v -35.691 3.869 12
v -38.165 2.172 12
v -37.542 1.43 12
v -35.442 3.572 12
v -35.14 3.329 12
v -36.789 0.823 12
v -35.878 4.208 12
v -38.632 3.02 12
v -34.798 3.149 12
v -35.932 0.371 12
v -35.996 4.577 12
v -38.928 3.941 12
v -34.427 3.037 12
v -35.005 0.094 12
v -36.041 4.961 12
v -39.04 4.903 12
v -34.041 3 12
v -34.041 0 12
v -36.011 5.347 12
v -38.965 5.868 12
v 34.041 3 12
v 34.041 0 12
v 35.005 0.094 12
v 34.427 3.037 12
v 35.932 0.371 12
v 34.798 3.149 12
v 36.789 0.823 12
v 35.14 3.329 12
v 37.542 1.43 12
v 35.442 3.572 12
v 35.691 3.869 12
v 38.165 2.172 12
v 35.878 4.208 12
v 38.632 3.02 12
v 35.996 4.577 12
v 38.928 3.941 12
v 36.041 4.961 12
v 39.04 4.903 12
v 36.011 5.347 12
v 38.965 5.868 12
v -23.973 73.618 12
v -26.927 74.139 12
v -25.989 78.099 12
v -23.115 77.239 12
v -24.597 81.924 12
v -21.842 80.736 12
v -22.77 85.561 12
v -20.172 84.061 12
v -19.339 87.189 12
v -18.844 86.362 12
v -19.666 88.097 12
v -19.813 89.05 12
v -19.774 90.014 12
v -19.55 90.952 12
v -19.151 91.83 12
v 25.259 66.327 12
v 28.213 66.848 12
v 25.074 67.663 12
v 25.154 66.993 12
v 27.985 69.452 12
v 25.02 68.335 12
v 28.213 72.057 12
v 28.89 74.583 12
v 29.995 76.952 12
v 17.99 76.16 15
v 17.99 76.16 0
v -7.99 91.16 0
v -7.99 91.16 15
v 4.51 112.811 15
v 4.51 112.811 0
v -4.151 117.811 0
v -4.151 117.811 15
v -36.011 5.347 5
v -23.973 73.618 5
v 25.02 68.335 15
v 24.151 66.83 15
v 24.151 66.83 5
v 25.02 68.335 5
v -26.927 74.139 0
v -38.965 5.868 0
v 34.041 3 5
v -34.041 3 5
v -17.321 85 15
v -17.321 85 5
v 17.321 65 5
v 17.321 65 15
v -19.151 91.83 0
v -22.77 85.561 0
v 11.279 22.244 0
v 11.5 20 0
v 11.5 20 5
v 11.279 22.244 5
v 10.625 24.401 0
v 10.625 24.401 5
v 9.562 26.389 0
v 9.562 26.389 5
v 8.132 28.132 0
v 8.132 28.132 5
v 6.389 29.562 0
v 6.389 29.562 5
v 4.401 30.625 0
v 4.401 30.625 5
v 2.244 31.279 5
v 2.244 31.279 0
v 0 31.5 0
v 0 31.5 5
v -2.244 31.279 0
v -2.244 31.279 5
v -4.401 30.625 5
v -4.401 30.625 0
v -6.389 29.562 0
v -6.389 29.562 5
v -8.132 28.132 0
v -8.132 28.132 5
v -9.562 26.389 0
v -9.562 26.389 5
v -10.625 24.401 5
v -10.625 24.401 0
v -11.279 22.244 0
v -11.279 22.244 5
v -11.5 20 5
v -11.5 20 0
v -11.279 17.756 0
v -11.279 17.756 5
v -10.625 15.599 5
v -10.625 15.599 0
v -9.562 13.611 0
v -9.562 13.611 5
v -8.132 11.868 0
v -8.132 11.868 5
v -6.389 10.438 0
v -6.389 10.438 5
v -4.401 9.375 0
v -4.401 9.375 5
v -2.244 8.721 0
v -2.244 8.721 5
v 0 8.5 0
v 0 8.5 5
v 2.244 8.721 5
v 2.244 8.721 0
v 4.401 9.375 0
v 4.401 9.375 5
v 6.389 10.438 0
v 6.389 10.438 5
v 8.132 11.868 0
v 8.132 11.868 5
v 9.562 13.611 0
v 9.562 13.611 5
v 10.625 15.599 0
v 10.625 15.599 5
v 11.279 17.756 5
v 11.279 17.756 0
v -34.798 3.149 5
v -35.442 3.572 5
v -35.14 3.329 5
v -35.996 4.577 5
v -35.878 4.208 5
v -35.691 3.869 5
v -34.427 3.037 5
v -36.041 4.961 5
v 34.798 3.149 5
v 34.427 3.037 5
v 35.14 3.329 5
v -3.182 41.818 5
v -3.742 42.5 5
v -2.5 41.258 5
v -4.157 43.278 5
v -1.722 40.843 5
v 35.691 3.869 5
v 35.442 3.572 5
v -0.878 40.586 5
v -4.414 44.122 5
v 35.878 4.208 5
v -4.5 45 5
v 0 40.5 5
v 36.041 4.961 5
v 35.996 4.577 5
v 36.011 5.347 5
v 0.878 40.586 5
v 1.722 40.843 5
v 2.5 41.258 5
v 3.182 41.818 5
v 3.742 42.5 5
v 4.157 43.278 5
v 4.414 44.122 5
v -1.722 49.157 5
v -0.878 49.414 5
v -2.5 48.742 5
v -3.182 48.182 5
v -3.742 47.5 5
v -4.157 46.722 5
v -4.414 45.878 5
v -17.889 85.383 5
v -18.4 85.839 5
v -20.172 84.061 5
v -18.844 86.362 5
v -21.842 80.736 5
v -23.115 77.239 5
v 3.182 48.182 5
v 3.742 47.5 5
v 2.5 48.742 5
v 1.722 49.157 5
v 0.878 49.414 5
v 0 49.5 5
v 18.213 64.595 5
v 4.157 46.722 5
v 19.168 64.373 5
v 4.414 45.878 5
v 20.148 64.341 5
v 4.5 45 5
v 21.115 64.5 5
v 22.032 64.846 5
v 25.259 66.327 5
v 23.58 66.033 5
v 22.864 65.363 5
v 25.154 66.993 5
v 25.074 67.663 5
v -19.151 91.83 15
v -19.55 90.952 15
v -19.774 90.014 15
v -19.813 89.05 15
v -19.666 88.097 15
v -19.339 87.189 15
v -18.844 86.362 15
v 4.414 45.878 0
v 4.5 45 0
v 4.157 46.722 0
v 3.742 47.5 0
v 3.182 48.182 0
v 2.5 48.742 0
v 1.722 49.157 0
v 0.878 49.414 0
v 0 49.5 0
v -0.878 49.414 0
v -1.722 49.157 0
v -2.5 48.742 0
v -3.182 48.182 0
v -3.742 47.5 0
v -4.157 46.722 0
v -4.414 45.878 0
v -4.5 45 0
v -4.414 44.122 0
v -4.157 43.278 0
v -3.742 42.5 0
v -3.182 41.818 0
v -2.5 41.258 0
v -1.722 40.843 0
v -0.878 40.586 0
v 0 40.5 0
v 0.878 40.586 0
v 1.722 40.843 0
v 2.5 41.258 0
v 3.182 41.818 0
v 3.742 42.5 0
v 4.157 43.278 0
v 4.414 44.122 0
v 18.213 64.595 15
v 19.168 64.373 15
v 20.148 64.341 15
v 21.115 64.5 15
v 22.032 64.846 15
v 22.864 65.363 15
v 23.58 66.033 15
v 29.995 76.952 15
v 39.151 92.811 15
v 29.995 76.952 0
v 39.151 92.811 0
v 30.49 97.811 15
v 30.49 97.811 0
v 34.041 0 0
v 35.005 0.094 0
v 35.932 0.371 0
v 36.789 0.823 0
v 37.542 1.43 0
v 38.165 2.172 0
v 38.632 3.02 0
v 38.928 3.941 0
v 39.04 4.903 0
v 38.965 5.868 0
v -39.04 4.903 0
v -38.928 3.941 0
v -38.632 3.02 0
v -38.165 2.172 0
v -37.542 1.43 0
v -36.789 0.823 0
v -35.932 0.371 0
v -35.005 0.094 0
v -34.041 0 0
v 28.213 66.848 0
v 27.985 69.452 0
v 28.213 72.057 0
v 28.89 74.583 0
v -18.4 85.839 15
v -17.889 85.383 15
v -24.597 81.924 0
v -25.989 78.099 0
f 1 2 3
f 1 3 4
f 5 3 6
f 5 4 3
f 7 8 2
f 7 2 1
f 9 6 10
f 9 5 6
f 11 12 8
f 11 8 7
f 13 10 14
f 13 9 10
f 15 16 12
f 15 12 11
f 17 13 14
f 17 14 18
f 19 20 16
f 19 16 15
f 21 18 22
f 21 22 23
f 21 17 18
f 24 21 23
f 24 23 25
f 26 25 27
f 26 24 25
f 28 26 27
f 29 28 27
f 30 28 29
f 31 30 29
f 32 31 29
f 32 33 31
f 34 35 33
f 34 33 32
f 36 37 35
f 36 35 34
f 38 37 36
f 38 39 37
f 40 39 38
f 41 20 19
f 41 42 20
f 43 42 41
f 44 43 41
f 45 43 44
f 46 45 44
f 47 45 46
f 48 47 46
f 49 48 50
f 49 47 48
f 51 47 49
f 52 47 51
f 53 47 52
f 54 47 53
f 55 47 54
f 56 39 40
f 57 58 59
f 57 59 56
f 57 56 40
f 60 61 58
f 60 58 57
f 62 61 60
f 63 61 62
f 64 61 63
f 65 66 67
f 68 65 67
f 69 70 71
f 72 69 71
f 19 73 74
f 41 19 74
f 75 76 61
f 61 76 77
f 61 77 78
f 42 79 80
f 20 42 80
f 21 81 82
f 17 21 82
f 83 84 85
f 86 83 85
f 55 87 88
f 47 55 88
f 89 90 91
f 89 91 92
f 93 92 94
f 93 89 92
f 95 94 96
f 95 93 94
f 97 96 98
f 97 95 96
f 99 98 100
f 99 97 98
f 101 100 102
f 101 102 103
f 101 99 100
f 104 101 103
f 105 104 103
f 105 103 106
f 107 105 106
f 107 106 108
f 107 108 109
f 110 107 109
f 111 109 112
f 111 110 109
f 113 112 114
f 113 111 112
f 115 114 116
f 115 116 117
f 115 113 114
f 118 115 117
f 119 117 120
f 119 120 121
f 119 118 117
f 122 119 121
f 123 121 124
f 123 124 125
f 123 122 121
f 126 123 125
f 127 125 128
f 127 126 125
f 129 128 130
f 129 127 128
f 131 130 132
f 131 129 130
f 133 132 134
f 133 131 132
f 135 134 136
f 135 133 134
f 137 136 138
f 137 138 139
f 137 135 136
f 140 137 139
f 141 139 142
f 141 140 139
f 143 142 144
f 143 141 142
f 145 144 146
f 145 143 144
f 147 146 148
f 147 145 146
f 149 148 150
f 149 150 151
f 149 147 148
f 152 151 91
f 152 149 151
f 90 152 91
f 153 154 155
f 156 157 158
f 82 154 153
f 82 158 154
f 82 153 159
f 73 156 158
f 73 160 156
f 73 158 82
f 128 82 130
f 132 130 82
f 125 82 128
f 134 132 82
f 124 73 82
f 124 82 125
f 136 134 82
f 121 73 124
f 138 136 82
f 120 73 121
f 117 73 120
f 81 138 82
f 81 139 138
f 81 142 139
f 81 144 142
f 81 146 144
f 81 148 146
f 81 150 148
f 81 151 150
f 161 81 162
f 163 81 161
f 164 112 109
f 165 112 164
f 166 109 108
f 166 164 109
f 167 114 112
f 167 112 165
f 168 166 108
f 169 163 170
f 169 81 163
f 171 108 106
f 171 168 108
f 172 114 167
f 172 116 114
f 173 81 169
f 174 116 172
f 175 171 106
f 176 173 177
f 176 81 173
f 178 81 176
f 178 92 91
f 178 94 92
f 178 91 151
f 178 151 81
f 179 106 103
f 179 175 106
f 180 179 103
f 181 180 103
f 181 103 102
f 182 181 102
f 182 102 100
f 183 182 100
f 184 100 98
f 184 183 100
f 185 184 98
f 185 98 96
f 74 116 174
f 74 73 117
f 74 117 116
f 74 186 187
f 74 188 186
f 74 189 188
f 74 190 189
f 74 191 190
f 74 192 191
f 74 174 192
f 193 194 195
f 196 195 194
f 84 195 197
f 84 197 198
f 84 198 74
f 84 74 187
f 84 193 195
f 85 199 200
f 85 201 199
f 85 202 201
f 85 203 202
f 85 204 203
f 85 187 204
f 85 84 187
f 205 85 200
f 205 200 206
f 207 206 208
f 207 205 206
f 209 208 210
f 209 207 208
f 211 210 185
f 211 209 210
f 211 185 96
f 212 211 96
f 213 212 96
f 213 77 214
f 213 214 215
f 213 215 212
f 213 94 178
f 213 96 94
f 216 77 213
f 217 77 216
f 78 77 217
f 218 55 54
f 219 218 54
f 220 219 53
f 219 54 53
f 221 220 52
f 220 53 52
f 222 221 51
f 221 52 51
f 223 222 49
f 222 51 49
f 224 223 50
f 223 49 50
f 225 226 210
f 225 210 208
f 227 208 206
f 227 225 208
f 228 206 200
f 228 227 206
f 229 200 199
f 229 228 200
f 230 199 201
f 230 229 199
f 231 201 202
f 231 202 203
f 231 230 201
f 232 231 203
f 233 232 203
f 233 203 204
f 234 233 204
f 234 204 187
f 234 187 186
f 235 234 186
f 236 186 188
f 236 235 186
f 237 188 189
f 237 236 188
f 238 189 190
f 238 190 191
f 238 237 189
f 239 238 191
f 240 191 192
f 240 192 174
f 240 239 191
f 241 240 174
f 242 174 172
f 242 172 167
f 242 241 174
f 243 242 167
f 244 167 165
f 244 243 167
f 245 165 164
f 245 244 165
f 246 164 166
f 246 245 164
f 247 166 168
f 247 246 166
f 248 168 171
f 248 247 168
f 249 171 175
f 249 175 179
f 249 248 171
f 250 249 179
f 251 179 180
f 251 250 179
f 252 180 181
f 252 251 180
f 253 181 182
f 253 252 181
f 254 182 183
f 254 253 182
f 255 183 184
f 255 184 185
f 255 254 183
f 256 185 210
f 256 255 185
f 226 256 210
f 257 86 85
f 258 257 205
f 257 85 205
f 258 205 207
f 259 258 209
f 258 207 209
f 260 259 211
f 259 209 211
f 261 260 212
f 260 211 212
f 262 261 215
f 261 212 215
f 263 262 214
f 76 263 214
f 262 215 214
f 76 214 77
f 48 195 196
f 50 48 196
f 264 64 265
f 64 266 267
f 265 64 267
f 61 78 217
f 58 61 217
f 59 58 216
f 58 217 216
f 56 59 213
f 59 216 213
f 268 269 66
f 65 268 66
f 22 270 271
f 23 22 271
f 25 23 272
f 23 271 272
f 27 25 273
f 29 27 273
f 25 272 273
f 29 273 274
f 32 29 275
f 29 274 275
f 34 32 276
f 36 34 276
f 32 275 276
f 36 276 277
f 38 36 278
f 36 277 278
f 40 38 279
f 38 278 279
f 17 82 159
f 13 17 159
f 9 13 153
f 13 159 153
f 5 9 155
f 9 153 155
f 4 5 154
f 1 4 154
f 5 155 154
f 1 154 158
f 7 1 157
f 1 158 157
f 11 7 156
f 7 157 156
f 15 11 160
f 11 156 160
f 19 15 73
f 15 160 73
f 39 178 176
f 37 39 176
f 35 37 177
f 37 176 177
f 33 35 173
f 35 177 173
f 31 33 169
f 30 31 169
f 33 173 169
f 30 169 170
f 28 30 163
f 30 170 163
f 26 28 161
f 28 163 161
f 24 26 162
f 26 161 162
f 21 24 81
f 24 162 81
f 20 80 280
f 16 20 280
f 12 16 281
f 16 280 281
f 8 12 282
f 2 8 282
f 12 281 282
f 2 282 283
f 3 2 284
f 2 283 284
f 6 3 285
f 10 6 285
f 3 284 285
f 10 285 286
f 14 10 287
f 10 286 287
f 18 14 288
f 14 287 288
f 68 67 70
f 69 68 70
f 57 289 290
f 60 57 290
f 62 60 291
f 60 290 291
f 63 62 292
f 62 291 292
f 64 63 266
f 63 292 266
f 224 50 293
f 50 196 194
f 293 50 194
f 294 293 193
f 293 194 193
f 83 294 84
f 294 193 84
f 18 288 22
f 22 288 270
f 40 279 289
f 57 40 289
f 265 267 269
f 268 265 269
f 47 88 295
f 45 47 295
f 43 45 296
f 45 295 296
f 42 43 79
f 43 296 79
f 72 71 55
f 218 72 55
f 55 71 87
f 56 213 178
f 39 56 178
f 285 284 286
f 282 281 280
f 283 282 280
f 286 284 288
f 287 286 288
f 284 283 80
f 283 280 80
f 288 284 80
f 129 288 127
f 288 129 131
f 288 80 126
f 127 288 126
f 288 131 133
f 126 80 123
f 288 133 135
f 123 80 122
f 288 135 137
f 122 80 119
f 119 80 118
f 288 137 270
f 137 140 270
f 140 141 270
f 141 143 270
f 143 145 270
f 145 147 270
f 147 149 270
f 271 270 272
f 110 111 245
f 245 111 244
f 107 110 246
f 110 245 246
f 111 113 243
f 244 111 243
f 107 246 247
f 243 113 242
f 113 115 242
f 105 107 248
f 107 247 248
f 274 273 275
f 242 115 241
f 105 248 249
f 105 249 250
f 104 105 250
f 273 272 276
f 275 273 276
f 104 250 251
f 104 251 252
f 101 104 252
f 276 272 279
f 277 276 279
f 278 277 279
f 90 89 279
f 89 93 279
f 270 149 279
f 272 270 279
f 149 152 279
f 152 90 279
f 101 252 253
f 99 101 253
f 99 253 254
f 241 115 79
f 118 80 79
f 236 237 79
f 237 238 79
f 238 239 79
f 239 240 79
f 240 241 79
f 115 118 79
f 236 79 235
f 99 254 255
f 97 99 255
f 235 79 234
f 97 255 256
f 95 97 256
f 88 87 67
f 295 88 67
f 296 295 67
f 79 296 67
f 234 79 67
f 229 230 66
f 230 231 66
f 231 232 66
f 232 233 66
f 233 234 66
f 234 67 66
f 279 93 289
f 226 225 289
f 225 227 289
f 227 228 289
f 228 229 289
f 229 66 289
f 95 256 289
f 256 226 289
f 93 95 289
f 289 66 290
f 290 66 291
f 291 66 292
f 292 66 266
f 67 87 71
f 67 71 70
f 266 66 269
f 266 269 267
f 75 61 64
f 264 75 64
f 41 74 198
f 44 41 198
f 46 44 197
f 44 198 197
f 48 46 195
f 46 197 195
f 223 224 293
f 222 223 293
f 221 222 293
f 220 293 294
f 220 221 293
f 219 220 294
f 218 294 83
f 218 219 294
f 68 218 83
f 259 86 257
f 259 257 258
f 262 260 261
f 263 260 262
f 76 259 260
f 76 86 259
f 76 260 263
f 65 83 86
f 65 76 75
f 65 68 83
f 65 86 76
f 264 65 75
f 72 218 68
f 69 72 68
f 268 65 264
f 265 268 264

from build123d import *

# Parameters (mm, degrees)
BOSS_EXTRUDE1_DEPTH = 12
SKETCH1_3_R         = 11.5
SKETCH1_3_R_2       = 4.5
BOSS_EXTRUDE2_DEPTH = 5
BOSS_EXTRUDE3_DEPTH = 15


with BuildPart() as part:
    # Sketch1 → Boss-Extrude1 (new body)
    with BuildSketch(Plane.XY):
        with BuildLine():
            ThreePointArc((-38.965270802, 5.868240888), (-37.871454253, 1.786061952), (-34.041232037, 0))
            Line((-34.041232037, 0), (34.041232037, 0))
            ThreePointArc((34.041232037, 0), (37.871454253, 1.786061952), (38.965270802, 5.868240888))
            Line((38.965270802, 5.868240888), (28.21296165, 66.847616303))
            ThreePointArc((28.21296165, 66.847616303), (28.21296165, 72.057061633), (29.994696888, 76.952338968))
            Line((29.994696888, 76.952338968), (25.019759703, 68.335494998))
            ThreePointArc((25.019759703, 68.335494998), (25.11090605, 67.327726281), (25.258538391, 66.32667177))
            Line((25.258538391, 66.32667177), (36.010847543, 5.347296355))
            ThreePointArc((36.010847543, 5.347296355), (35.573320923, 3.714424781), (34.041232037, 3))
            Line((34.041232037, 3), (-34.041232037, 3))
            ThreePointArc((-34.041232037, 3), (-35.573320923, 3.714424781), (-36.010847543, 5.347296355))
            Line((-36.010847543, 5.347296355), (-23.972860012, 73.618116188))
            ThreePointArc((-23.972860012, 73.618116188), (-22.52917578, 79.006019089), (-20.171824836, 84.061374502))
            Line((-20.171824836, 84.061374502), (-18.843846731, 86.361500052))
            ThreePointArc((-18.843846731, 86.361500052), (-19.812658656, 89.05006884), (-19.150635095, 91.830127019))
            Line((-19.150635095, 91.830127019), (-22.769901048, 85.561374502))
            ThreePointArc((-22.769901048, 85.561374502), (-25.348253643, 80.032079519), (-26.927283271, 74.139060721))
            Line((-26.927283271, 74.139060721), (-38.965270802, 5.868240888))
        make_face()
    extrude(amount=BOSS_EXTRUDE1_DEPTH)

    # Sketch1<3> → Boss-Extrude2 (add)
    with BuildSketch(Plane.XY):
        with BuildLine():
            ThreePointArc((25.258538391, 66.32667177), (25.11090605, 67.327726281), (25.019759703, 68.335494998))
            Line((25.019759703, 68.335494998), (24.150635095, 66.830127019))
            ThreePointArc((24.150635095, 66.830127019), (21.114603301, 64.500497887), (17.320508076, 65))
            Line((17.320508076, 65), (-17.320508076, 85))
            ThreePointArc((-17.320508076, 85), (-18.152460566, 85.602112454), (-18.843846731, 86.361500052))
            Line((-18.843846731, 86.361500052), (-20.171824836, 84.061374502))
            ThreePointArc((-20.171824836, 84.061374502), (-22.52917578, 79.006019089), (-23.972860012, 73.618116188))
            Line((-23.972860012, 73.618116188), (-36.010847543, 5.347296355))
            ThreePointArc((-36.010847543, 5.347296355), (-35.573320923, 3.714424781), (-34.041232037, 3))
            Line((-34.041232037, 3), (34.041232037, 3))
            ThreePointArc((34.041232037, 3), (35.573320923, 3.714424781), (36.010847543, 5.347296355))
            Line((36.010847543, 5.347296355), (25.258538391, 66.32667177))
        make_face()
        with Locations((0, 20)):
            Circle(SKETCH1_3_R, mode=Mode.SUBTRACT)
        with Locations((0, 45)):
            Circle(SKETCH1_3_R_2, mode=Mode.SUBTRACT)
    extrude(amount=BOSS_EXTRUDE2_DEPTH)

    # Sketch1<4> → Boss-Extrude3 (add)
    with BuildSketch(Plane.XY):
        with BuildLine():
            Line((25.019759703, 68.335494998), (29.994696888, 76.952338968))
            Line((29.994696888, 76.952338968), (39.150635095, 92.810889132))
            Line((39.150635095, 92.810889132), (30.490381057, 97.810889132))
            Line((30.490381057, 97.810889132), (17.990381057, 76.160254038))
            Line((17.990381057, 76.160254038), (-7.990381057, 91.160254038))
            Line((-7.990381057, 91.160254038), (4.509618943, 112.810889132))
            Line((4.509618943, 112.810889132), (-4.150635095, 117.810889132))
            Line((-4.150635095, 117.810889132), (-19.150635095, 91.830127019))
            ThreePointArc((-19.150635095, 91.830127019), (-19.812658656, 89.05006884), (-18.843846731, 86.361500052))
            ThreePointArc((-18.843846731, 86.361500052), (-18.152460566, 85.602112454), (-17.320508076, 85))
            Line((-17.320508076, 85), (17.320508076, 65))
            ThreePointArc((17.320508076, 65), (21.114603301, 64.500497887), (24.150635095, 66.830127019))
            Line((24.150635095, 66.830127019), (25.019759703, 68.335494998))
        make_face()
    extrude(amount=BOSS_EXTRUDE3_DEPTH)


solid = part.part
